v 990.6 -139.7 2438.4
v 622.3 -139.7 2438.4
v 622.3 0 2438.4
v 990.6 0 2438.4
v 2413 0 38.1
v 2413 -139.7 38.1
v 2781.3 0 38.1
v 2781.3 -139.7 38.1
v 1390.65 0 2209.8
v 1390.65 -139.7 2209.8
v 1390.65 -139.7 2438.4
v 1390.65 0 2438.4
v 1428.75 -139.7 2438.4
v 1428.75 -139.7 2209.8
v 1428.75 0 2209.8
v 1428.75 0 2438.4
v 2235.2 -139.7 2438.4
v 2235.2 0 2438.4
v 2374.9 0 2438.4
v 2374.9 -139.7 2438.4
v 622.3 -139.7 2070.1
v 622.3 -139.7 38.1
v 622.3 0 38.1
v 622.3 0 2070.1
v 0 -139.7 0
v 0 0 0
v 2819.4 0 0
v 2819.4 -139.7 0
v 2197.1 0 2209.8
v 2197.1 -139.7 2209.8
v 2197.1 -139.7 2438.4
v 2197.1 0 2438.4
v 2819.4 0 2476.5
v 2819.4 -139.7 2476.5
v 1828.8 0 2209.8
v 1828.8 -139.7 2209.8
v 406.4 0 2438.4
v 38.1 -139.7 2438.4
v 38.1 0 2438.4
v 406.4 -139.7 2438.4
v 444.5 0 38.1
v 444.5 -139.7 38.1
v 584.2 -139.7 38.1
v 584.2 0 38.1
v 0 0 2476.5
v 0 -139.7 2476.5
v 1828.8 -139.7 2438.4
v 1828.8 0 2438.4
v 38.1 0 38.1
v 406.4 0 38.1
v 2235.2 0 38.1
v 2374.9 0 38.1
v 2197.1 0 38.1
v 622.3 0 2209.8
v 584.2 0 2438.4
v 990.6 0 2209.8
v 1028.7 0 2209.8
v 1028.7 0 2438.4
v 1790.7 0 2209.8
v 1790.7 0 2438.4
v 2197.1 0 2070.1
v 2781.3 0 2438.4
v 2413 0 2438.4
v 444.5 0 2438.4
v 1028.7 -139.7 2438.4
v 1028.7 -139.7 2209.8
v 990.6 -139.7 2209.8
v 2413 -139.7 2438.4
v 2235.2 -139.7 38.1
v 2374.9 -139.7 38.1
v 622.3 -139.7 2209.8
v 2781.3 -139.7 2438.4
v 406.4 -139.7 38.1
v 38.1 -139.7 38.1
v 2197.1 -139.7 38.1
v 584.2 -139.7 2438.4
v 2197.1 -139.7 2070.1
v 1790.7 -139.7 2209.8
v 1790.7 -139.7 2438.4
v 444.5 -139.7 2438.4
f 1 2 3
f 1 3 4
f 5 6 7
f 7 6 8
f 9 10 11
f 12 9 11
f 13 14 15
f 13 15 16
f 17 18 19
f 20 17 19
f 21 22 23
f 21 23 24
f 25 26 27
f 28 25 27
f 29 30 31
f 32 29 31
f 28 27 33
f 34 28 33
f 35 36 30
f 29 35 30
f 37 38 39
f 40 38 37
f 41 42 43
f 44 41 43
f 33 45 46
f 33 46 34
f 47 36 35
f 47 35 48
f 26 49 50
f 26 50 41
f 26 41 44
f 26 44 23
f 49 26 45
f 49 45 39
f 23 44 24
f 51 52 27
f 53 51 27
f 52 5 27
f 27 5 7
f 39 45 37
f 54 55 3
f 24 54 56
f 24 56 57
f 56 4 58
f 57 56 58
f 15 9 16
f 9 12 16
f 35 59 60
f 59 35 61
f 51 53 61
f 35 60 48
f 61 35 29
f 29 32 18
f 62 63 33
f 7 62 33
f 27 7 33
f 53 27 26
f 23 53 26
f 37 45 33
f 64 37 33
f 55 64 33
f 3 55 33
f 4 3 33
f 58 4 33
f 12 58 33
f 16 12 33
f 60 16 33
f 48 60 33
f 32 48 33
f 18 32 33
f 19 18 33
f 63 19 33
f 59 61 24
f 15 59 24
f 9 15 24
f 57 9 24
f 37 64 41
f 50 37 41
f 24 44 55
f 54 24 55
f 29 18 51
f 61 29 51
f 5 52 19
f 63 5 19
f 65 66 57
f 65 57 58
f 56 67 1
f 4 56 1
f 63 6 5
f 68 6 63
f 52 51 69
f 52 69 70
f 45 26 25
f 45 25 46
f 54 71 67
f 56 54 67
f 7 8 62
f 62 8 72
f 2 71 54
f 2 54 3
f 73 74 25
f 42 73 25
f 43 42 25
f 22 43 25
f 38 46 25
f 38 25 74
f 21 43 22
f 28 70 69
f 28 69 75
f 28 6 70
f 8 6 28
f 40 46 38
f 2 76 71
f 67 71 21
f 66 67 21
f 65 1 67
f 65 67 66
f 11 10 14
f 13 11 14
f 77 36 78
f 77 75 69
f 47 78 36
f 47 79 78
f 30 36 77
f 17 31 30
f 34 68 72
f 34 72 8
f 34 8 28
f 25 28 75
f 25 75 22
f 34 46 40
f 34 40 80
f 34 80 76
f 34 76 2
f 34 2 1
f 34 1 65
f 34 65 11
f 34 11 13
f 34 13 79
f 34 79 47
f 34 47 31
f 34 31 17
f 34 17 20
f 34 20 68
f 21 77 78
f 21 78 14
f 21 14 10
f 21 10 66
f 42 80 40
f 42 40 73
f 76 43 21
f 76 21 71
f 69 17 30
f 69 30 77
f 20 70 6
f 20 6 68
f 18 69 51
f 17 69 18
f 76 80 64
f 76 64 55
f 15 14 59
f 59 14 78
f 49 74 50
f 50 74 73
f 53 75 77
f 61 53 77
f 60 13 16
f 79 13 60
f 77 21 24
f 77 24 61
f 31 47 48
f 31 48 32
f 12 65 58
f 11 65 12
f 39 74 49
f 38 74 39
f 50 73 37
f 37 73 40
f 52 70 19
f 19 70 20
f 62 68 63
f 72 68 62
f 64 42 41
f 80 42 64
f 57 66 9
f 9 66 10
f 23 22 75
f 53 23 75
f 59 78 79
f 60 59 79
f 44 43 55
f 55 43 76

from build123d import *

# Parameters (mm, degrees)
F0_W     = 2819.4
F0_H     = 2476.5
F1_DEPTH = 139.7
F2_W     = 1574.8
F2_H     = 2032
F3_DEPTH = 139.701
F4_W     = 368.3
F4_H     = 2400.3
F4_W_2   = 139.7
F4_H_2   = 228.6
F4_W_3   = 361.95
F5_DEPTH = 139.701


with BuildPart() as f1:
    # F0 (on Front) → F1 (new body)
    with BuildSketch(Plane.XZ):
        with Locations((1409.7, 1238.25)):
            Rectangle(F0_W, F0_H)
    extrude(amount=F1_DEPTH)

    # F2 (on face) → F3 (cut, through all)
    with BuildSketch(Plane.XZ.offset(139.7)):
        with Locations((1409.7, 1054.1)):
            Rectangle(F2_W, F2_H)
    extrude(amount=-F3_DEPTH, mode=Mode.SUBTRACT)

    # F4 (on face) → F5 (cut, through all)
    with BuildSketch(Plane.XZ.offset(139.7)):
        with Locations((2597.15, 1238.25)):
            Rectangle(F4_W, F4_H)
        with Locations((2305.05, 1238.25)):
            Rectangle(F4_W_2, F4_H)
        with Locations((2012.95, 2324.1)):
            Rectangle(F4_W, F4_H_2)
        with Locations((222.25, 1238.25)):
            Rectangle(F4_W, F4_H)
        with Locations((514.35, 1238.25)):
            Rectangle(F4_W_2, F4_H)
        with Locations((806.45, 2324.1)):
            Rectangle(F4_W, F4_H_2)
        with Locations((1209.675, 2324.1)):
            Rectangle(F4_W_3, F4_H_2)
        with Locations((1609.725, 2324.1)):
            Rectangle(F4_W_3, F4_H_2)
    extrude(amount=-F5_DEPTH, mode=Mode.SUBTRACT)


solid = f1.part
